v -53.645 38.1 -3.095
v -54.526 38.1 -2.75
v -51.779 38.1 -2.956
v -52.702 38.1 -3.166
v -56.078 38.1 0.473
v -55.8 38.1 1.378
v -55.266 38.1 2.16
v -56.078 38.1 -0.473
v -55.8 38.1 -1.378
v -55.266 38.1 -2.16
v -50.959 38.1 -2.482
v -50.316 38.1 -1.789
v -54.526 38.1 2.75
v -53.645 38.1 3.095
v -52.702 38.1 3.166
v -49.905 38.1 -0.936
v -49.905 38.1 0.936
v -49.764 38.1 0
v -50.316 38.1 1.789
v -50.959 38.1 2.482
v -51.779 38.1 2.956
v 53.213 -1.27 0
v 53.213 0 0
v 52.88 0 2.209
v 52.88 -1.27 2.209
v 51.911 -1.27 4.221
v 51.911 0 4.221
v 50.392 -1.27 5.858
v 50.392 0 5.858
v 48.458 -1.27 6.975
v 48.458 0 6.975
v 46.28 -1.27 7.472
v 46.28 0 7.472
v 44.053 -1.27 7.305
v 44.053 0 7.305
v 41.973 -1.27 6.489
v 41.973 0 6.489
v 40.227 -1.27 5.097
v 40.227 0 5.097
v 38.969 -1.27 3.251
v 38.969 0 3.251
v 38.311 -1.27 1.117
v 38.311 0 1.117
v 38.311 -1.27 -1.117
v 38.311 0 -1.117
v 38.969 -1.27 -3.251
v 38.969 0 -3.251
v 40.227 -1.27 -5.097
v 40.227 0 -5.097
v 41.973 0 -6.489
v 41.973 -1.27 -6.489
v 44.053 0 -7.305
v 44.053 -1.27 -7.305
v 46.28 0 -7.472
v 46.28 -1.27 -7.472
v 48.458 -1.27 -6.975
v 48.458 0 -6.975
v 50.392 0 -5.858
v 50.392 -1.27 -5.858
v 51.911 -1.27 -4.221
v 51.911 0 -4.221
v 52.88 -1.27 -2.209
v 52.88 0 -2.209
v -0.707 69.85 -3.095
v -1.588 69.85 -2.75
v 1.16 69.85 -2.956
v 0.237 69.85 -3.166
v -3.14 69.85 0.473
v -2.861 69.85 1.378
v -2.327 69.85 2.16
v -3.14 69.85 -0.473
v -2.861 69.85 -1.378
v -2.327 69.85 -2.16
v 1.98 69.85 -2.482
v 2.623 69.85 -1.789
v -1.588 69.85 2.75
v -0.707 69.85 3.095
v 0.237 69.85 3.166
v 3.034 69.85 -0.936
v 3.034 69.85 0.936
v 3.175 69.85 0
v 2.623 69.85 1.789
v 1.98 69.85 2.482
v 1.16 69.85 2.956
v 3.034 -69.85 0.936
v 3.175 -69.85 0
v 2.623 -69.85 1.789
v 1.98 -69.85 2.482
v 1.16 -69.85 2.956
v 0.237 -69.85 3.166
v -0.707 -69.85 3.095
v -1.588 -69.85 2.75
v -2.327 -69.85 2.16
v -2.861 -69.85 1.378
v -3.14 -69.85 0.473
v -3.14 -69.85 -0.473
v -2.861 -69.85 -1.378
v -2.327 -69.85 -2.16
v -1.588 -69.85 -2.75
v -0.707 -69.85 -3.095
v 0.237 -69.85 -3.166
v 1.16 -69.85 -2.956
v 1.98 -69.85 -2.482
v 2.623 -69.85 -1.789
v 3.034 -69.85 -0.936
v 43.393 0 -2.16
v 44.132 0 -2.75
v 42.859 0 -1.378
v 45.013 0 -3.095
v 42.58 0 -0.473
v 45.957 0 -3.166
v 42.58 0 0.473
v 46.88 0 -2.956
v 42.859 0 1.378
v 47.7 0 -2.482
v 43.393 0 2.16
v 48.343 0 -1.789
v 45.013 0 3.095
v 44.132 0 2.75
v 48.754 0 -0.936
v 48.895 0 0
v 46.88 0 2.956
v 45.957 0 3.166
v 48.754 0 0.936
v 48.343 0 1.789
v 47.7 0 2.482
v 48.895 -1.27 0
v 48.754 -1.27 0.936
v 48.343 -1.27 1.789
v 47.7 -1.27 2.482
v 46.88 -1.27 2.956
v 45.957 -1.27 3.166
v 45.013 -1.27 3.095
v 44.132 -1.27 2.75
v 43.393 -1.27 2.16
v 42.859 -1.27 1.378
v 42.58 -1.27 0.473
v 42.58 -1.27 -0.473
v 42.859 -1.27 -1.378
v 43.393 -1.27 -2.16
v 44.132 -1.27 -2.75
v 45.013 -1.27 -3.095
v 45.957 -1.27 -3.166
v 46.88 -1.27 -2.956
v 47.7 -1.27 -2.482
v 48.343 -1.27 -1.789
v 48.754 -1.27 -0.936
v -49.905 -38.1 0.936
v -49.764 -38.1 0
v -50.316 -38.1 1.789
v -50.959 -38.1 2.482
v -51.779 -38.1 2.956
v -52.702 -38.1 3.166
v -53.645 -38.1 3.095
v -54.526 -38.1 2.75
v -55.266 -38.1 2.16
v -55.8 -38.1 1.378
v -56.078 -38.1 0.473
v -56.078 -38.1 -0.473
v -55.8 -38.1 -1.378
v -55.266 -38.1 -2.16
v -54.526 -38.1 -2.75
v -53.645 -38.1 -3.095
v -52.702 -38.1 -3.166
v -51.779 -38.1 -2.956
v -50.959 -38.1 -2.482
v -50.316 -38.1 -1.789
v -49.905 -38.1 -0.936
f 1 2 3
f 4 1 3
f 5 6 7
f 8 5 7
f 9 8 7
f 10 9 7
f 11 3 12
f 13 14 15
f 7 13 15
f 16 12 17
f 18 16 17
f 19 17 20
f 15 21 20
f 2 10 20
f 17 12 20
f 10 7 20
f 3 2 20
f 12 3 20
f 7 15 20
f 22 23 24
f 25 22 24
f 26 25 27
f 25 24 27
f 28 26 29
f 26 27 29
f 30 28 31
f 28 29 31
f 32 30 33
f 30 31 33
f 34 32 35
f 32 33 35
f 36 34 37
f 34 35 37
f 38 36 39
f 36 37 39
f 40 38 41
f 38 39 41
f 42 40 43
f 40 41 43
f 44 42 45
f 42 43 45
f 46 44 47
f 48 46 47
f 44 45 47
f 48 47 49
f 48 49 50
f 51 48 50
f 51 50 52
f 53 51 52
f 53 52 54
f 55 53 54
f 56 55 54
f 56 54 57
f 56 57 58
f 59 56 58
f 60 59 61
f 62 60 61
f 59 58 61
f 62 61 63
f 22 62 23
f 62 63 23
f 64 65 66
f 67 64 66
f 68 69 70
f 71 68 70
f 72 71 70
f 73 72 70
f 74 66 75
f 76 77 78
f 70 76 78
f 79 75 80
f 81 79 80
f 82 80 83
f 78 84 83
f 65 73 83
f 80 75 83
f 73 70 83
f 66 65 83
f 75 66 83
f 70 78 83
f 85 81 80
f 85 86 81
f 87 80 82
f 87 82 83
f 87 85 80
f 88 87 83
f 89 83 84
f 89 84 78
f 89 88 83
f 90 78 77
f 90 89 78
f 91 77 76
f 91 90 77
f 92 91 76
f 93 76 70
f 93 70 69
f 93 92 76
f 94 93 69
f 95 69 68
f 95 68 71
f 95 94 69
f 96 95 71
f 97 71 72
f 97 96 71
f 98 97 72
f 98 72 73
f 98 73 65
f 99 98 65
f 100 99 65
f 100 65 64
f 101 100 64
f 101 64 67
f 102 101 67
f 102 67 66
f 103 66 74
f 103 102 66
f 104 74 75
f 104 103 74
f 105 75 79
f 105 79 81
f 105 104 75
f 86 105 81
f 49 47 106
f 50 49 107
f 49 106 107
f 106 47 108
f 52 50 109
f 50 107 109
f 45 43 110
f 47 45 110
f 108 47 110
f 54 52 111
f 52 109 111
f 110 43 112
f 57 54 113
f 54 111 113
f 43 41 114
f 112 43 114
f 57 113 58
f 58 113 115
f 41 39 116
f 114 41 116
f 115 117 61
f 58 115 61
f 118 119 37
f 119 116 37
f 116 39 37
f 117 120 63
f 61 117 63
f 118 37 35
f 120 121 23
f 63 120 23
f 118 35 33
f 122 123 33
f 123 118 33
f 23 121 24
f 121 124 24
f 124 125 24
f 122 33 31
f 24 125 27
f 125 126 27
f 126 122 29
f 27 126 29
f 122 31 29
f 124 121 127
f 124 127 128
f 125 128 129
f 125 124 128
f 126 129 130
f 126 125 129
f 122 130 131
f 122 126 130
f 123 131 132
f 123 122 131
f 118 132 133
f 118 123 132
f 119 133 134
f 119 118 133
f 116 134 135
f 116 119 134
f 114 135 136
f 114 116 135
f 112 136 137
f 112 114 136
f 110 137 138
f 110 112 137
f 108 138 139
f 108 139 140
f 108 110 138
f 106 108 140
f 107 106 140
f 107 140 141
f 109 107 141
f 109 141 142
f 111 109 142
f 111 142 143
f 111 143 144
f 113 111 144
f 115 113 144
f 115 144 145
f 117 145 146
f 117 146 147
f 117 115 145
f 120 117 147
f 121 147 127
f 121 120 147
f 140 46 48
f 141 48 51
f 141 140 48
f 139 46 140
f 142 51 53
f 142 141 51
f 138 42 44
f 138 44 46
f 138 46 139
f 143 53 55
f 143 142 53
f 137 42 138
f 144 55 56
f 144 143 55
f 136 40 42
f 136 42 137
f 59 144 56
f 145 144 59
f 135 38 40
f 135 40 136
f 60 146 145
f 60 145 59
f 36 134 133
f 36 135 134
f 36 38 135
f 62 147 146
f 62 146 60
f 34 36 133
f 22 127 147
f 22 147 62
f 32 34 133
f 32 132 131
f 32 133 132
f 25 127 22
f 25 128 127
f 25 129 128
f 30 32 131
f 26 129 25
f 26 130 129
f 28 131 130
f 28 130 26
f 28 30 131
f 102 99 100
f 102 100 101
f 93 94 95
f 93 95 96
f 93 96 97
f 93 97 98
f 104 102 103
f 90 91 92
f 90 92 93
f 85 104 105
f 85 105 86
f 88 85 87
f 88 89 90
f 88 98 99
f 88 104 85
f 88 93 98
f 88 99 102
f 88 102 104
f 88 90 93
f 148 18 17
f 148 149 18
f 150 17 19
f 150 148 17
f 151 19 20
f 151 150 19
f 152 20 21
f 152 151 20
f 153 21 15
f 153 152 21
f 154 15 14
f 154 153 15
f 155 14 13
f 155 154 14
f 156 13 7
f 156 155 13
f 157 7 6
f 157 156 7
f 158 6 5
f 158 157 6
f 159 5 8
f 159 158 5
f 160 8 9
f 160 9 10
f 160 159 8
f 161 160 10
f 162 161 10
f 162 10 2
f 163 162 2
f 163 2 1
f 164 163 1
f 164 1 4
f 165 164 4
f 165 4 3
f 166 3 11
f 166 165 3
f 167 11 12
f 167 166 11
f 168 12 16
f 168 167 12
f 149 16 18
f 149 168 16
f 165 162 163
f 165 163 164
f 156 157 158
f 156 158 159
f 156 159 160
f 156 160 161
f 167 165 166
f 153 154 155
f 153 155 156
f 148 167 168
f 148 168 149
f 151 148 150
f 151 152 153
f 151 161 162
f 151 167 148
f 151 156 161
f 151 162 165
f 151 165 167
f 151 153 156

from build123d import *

# Parameters (mm, degrees)
F0_R     = 3.175
F1_DEPTH = 38.1
F2_DEPTH = 69.85
F3_R     = 7.493
F3_R_2   = 3.175
F4_DEPTH = 1.27


with BuildPart() as f1:
    # F0 (on Front) → F1 (new body, symmetric)
    with BuildSketch(Plane.XZ):
        with Locations((-52.938949, 0)):
            Circle(F0_R)
    extrude(amount=F1_DEPTH, both=True)


with BuildPart() as f2:
    # F0 (on Front) → F2 (new body, symmetric)
    with BuildSketch(Plane.XZ):
        Circle(F0_R)
    extrude(amount=F2_DEPTH, both=True)


with BuildPart() as f4:
    # F3 (on Front) → F4 (new body)
    with BuildSketch(Plane.XZ):
        with Locations((45.72, 0)):
            Circle(F3_R)
        with Locations((45.72, 0)):
            Circle(F3_R_2, mode=Mode.SUBTRACT)
    extrude(amount=F4_DEPTH)


solid = Compound([f1.part, f2.part, f4.part])
